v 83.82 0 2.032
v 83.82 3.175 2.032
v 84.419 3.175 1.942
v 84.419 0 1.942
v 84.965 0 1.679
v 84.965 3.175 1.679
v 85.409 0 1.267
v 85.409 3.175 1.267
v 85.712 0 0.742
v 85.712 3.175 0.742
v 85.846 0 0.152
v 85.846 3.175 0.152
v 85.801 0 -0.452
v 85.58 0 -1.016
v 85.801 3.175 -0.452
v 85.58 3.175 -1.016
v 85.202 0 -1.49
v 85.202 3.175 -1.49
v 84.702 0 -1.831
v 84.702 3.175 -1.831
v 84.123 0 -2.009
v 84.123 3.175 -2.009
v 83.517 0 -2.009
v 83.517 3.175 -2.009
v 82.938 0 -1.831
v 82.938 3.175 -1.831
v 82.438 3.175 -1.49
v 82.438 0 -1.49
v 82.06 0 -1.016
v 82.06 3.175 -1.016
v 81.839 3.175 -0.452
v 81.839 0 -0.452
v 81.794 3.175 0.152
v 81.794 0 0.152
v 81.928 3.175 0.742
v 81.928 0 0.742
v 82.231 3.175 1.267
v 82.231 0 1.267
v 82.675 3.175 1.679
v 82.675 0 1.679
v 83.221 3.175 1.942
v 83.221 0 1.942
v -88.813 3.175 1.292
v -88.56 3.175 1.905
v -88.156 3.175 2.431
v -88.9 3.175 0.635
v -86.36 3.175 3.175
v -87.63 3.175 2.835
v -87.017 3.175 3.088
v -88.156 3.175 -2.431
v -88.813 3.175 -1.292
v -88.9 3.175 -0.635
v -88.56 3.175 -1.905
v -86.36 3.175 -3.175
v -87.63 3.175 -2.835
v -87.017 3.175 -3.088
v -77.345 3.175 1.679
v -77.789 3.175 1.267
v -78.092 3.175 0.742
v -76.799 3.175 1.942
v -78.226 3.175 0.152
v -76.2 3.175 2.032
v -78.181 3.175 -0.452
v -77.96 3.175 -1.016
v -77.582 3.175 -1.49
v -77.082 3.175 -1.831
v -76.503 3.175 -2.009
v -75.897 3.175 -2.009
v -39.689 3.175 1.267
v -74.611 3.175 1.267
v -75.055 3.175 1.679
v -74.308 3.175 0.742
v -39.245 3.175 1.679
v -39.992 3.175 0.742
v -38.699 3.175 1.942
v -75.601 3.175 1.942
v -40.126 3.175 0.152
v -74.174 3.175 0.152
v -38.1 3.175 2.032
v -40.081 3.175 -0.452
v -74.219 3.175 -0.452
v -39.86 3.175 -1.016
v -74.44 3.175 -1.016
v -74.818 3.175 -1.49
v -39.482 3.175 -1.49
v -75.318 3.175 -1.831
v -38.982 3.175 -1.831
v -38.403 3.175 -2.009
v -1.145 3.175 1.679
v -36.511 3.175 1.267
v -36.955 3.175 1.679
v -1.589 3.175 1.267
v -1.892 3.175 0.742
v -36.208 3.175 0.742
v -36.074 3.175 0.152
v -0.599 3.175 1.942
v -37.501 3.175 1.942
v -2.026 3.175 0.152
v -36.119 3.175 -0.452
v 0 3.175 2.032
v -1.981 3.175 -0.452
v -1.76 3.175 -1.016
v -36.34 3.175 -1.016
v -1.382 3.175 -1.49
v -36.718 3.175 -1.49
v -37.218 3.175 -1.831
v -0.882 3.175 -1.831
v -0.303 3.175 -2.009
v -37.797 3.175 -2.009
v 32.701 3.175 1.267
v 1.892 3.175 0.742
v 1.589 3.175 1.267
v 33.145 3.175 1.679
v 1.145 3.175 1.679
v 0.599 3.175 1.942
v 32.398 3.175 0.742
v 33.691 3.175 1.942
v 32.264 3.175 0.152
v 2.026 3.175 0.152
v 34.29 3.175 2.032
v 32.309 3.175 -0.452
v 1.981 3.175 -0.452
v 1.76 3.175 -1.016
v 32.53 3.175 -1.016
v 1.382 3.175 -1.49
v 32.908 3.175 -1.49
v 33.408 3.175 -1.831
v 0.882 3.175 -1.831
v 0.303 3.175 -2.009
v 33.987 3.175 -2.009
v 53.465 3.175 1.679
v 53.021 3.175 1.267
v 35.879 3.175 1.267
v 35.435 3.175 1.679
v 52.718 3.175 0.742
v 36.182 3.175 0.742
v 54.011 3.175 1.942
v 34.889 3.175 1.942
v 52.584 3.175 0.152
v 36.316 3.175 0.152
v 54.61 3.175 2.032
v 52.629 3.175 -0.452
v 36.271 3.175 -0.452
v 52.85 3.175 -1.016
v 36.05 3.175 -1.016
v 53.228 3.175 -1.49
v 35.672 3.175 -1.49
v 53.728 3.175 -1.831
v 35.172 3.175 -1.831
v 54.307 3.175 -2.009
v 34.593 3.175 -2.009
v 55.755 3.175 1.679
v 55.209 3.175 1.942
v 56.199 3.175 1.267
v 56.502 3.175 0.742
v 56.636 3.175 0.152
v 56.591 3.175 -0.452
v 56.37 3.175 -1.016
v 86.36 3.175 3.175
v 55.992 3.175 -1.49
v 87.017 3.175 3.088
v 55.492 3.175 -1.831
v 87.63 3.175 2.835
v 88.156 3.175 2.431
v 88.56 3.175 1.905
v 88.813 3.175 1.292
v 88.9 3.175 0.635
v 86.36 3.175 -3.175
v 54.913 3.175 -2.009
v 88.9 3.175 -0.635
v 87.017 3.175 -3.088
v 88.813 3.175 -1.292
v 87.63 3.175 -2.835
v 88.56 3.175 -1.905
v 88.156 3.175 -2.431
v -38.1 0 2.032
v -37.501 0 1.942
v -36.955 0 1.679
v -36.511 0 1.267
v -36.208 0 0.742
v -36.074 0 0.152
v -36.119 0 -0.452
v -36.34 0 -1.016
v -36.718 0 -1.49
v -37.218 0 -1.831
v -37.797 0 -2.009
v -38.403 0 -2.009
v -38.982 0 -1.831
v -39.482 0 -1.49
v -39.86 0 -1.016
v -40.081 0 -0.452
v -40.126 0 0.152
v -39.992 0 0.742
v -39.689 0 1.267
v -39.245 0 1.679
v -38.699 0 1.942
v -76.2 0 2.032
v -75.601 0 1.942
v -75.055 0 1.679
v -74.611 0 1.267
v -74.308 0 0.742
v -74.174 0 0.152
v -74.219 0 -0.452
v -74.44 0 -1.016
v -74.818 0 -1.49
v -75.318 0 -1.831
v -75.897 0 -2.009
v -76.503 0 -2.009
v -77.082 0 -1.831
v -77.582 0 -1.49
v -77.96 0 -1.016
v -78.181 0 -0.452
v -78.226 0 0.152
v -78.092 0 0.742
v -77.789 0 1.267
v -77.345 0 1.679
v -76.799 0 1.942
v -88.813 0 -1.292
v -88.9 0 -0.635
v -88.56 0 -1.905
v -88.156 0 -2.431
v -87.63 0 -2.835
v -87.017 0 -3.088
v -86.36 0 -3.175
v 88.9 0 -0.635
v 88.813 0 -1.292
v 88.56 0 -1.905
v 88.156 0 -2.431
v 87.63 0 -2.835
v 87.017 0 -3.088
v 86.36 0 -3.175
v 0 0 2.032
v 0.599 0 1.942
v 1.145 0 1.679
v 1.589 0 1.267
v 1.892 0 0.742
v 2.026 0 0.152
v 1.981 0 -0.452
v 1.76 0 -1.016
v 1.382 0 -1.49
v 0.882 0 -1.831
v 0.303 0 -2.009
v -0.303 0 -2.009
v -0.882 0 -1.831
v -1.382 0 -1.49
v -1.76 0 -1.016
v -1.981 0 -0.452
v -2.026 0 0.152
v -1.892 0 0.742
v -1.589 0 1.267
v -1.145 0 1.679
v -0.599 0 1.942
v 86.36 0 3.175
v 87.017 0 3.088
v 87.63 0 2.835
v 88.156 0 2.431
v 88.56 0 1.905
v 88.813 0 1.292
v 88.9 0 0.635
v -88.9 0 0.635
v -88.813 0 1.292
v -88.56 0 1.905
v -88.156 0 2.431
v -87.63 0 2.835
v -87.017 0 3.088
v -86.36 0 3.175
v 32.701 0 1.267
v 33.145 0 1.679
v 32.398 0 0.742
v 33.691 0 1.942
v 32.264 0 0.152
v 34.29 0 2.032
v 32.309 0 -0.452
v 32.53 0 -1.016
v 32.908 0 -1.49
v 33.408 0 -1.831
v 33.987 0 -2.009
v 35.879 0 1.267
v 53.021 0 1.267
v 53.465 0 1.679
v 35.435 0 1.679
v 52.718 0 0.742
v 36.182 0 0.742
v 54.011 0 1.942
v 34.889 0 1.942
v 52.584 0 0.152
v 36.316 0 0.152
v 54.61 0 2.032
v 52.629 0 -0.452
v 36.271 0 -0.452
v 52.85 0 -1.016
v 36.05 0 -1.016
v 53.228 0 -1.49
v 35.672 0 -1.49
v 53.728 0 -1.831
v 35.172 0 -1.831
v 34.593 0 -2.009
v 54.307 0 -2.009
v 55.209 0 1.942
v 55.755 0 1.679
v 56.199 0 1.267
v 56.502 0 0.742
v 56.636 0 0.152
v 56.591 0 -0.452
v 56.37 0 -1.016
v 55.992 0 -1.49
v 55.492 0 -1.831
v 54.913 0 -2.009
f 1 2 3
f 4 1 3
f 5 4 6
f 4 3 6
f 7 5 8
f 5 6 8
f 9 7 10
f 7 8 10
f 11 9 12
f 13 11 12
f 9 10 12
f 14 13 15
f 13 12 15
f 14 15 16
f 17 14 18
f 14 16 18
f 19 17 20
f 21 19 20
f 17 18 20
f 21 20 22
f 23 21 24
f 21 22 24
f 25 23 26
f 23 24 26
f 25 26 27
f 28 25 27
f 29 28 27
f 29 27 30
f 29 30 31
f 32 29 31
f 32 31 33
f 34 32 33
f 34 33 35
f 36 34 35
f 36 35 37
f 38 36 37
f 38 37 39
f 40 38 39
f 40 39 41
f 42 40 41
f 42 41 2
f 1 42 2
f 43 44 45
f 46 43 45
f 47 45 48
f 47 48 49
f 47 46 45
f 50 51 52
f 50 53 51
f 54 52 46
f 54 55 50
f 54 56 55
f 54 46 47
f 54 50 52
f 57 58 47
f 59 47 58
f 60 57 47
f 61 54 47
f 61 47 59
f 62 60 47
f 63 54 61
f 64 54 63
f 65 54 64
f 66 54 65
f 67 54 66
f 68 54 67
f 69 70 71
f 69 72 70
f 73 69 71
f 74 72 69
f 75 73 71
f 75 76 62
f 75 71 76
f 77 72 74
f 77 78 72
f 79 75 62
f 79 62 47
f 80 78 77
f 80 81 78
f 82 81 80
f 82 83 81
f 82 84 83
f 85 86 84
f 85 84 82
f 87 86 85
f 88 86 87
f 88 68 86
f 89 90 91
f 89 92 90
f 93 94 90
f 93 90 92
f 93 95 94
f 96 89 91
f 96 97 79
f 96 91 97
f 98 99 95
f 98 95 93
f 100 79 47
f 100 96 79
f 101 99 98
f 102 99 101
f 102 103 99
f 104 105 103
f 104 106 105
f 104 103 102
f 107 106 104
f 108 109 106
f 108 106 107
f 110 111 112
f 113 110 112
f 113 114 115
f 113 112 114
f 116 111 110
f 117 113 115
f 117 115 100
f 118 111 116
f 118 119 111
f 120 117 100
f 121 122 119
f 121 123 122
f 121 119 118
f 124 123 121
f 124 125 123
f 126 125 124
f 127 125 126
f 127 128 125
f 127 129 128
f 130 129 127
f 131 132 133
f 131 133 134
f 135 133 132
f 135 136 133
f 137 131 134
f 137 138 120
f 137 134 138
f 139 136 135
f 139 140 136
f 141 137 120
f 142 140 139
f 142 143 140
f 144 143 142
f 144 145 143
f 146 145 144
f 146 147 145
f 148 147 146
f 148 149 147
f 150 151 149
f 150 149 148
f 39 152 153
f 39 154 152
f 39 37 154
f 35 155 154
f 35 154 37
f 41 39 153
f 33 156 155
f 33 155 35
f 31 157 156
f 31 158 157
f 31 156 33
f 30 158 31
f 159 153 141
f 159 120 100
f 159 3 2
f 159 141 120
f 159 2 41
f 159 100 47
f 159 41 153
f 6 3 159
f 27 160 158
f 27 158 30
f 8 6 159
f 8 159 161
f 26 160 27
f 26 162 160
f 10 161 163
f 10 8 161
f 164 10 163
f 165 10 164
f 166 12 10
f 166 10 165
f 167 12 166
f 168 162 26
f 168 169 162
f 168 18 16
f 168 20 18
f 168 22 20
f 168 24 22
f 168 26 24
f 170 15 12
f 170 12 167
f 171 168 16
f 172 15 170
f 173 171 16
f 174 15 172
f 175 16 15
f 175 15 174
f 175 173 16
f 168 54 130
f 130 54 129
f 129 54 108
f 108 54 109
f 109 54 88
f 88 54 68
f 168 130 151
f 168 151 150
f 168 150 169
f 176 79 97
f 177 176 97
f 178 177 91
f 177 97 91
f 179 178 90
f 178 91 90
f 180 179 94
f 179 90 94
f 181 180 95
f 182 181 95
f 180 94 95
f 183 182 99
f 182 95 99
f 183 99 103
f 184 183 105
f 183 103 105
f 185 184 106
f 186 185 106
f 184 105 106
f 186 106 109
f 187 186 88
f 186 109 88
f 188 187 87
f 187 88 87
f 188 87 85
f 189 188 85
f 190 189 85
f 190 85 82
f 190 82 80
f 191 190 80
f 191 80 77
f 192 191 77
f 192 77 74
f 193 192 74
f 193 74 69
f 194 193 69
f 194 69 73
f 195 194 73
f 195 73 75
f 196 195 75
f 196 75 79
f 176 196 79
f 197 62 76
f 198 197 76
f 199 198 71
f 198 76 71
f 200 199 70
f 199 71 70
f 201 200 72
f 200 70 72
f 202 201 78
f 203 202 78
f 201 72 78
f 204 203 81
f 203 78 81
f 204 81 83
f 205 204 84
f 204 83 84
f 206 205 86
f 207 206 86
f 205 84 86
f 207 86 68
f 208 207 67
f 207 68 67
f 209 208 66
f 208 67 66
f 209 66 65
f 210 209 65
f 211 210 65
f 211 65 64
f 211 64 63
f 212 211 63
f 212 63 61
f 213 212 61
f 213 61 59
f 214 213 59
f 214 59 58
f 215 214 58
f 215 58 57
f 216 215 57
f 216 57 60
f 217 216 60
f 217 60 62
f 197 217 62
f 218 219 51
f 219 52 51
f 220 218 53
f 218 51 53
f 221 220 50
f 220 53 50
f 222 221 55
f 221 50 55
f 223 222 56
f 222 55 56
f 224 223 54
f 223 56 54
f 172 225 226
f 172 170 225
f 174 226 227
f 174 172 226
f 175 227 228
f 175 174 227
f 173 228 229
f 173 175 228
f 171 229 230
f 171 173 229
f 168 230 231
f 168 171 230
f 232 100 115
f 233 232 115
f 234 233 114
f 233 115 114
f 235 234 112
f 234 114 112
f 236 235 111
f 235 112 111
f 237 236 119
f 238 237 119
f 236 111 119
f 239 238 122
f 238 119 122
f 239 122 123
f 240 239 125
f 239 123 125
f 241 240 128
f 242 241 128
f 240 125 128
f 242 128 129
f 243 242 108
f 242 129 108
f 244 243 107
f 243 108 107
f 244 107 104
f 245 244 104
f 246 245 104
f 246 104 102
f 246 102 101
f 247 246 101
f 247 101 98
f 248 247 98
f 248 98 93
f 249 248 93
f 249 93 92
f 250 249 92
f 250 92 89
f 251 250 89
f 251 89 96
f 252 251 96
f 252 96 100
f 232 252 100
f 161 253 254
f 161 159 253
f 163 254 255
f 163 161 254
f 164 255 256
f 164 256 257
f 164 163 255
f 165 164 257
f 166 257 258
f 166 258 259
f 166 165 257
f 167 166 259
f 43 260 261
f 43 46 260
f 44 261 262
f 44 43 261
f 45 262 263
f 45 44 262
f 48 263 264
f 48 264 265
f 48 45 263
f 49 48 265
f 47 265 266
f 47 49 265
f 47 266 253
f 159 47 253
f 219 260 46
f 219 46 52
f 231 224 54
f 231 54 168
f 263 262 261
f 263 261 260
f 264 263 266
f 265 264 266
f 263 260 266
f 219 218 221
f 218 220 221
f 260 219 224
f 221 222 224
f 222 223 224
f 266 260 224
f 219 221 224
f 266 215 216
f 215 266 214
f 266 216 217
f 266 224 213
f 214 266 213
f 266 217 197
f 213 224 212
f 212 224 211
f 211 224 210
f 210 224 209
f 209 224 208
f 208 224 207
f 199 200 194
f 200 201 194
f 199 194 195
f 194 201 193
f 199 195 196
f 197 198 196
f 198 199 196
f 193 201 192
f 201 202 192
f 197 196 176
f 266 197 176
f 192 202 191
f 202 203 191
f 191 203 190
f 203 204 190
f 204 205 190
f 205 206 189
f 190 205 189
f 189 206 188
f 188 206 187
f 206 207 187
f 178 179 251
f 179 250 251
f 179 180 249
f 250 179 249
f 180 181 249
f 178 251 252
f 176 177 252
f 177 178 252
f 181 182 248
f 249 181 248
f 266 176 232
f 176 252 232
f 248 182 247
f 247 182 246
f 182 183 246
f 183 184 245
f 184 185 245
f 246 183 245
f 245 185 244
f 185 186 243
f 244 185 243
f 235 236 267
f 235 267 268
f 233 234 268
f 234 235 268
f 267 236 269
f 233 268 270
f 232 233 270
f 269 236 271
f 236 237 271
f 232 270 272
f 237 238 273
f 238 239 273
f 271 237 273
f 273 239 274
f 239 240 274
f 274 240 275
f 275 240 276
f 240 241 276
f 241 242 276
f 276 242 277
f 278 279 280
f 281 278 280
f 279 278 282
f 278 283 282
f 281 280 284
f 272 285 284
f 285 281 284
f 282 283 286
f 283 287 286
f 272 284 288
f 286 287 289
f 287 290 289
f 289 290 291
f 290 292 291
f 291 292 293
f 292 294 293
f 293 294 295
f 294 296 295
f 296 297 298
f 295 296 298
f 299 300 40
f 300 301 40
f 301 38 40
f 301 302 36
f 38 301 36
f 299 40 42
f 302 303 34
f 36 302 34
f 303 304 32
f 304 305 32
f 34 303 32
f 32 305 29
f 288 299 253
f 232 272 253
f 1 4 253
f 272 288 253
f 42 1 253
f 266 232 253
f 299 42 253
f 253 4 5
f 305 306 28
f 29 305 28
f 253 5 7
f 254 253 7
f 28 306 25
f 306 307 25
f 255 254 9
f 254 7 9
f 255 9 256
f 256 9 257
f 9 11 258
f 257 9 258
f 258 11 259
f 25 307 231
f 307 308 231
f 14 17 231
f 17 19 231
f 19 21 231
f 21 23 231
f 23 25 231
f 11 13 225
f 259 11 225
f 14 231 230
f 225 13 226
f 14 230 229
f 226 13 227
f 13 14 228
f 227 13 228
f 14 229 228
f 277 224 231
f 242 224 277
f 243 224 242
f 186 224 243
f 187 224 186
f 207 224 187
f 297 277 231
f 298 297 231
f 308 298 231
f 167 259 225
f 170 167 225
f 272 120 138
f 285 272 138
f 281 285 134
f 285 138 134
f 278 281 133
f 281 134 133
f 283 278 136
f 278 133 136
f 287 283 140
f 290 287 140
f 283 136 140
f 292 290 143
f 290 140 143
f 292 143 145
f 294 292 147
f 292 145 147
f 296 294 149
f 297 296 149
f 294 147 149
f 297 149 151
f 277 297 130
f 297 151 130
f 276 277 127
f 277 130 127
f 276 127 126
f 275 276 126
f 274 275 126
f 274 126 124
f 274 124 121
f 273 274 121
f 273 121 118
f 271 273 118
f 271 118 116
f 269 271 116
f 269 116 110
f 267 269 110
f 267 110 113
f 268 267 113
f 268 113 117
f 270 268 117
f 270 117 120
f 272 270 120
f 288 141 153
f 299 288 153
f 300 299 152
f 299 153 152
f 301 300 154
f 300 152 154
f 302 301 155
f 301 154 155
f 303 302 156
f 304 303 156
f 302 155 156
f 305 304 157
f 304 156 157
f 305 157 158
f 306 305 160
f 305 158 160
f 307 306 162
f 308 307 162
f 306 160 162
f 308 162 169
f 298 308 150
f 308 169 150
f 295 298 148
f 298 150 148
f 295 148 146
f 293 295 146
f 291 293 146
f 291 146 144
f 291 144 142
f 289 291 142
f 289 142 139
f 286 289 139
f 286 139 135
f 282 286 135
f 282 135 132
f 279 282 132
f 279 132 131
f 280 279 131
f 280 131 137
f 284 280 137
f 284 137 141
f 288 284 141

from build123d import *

# Parameters (mm, degrees)
SKETCH1_W           = 177.8
SKETCH1_H           = 6.35
BOSS_EXTRUDE1_DEPTH = 3.175
FILLET1_R           = 2.54
CUT_EXTRUDE1_REACH  = 91.013
SKETCH2_R           = 2.032


with BuildPart() as part:
    # Sketch1 → Boss-Extrude1 (new body)
    with BuildSketch(Plane(origin=(0, 0, 0), x_dir=(1, 0, 0), z_dir=(0, 1, 0))):
        Rectangle(SKETCH1_W, SKETCH1_H)
    extrude(amount=BOSS_EXTRUDE1_DEPTH)

    # Fillet1
    fillet1_edges = [part.edges().sort_by_distance(p)[0] for p in [
        (-88.9, 1.5875, 3.175),
        (-88.9, 1.5875, -3.175),
        (88.9, 1.5875, -3.175),
        (88.9, 1.5875, 3.175),
    ]]
    fillet(fillet1_edges, radius=FILLET1_R)

    # Sketch2 → Cut-Extrude1 (cut, up to next)
    with BuildSketch(Plane(origin=(0, 3.175, 0), x_dir=(1, 0, 0), z_dir=(0, 1, 0)), mode=Mode.PRIVATE) as cut_extrude1_sk1:
        with Locations(Location((-76.2, 0, 0), (0, 0, 270))):
            Circle(SKETCH2_R)
    cut_extrude1_tool1 = extrude(cut_extrude1_sk1.sketch, amount=-CUT_EXTRUDE1_REACH, mode=Mode.PRIVATE) & part.part
    # Sketch2 → Cut-Extrude1 (cut, up to next)
    with BuildSketch(Plane(origin=(0, 3.175, 0), x_dir=(1, 0, 0), z_dir=(0, 1, 0)), mode=Mode.PRIVATE) as cut_extrude1_sk2:
        with Locations(Location((0, 0, 0), (0, 0, 270))):
            Circle(SKETCH2_R)
    cut_extrude1_tool2 = extrude(cut_extrude1_sk2.sketch, amount=-CUT_EXTRUDE1_REACH, mode=Mode.PRIVATE) & part.part
    # Sketch2 → Cut-Extrude1 (cut, up to next)
    with BuildSketch(Plane(origin=(0, 3.175, 0), x_dir=(1, 0, 0), z_dir=(0, 1, 0)), mode=Mode.PRIVATE) as cut_extrude1_sk3:
        with Locations(Location((-38.1, 0, 0), (0, 0, 270))):
            Circle(SKETCH2_R)
    cut_extrude1_tool3 = extrude(cut_extrude1_sk3.sketch, amount=-CUT_EXTRUDE1_REACH, mode=Mode.PRIVATE) & part.part
    # Sketch2 → Cut-Extrude1 (cut, up to next)
    with BuildSketch(Plane(origin=(0, 3.175, 0), x_dir=(1, 0, 0), z_dir=(0, 1, 0)), mode=Mode.PRIVATE) as cut_extrude1_sk4:
        with Locations(Location((83.82, 0, 0), (0, 0, 270))):
            Circle(SKETCH2_R)
    cut_extrude1_tool4 = extrude(cut_extrude1_sk4.sketch, amount=-CUT_EXTRUDE1_REACH, mode=Mode.PRIVATE) & part.part
    # Sketch2 → Cut-Extrude1 (cut, up to next)
    with BuildSketch(Plane(origin=(0, 3.175, 0), x_dir=(1, 0, 0), z_dir=(0, 1, 0)), mode=Mode.PRIVATE) as cut_extrude1_sk5:
        with Locations(Location((54.61, 0, 0), (0, 0, 270))):
            Circle(SKETCH2_R)
    cut_extrude1_tool5 = extrude(cut_extrude1_sk5.sketch, amount=-CUT_EXTRUDE1_REACH, mode=Mode.PRIVATE) & part.part
    # Sketch2 → Cut-Extrude1 (cut, up to next)
    with BuildSketch(Plane(origin=(0, 3.175, 0), x_dir=(1, 0, 0), z_dir=(0, 1, 0)), mode=Mode.PRIVATE) as cut_extrude1_sk6:
        with Locations(Location((34.29, 0, 0), (0, 0, 270))):
            Circle(SKETCH2_R)
    cut_extrude1_tool6 = extrude(cut_extrude1_sk6.sketch, amount=-CUT_EXTRUDE1_REACH, mode=Mode.PRIVATE) & part.part
    add(cut_extrude1_tool1.solids().sort_by_distance((-76.2, 3.175, 0))[0], mode=Mode.SUBTRACT)
    add(cut_extrude1_tool2.solids().sort_by_distance((0, 3.175, 0))[0], mode=Mode.SUBTRACT)
    add(cut_extrude1_tool3.solids().sort_by_distance((-38.1, 3.175, 0))[0], mode=Mode.SUBTRACT)
    add(cut_extrude1_tool4.solids().sort_by_distance((83.82, 3.175, 0))[0], mode=Mode.SUBTRACT)
    add(cut_extrude1_tool5.solids().sort_by_distance((54.61, 3.175, 0))[0], mode=Mode.SUBTRACT)
    add(cut_extrude1_tool6.solids().sort_by_distance((34.29, 3.175, 0))[0], mode=Mode.SUBTRACT)


solid = part.part
